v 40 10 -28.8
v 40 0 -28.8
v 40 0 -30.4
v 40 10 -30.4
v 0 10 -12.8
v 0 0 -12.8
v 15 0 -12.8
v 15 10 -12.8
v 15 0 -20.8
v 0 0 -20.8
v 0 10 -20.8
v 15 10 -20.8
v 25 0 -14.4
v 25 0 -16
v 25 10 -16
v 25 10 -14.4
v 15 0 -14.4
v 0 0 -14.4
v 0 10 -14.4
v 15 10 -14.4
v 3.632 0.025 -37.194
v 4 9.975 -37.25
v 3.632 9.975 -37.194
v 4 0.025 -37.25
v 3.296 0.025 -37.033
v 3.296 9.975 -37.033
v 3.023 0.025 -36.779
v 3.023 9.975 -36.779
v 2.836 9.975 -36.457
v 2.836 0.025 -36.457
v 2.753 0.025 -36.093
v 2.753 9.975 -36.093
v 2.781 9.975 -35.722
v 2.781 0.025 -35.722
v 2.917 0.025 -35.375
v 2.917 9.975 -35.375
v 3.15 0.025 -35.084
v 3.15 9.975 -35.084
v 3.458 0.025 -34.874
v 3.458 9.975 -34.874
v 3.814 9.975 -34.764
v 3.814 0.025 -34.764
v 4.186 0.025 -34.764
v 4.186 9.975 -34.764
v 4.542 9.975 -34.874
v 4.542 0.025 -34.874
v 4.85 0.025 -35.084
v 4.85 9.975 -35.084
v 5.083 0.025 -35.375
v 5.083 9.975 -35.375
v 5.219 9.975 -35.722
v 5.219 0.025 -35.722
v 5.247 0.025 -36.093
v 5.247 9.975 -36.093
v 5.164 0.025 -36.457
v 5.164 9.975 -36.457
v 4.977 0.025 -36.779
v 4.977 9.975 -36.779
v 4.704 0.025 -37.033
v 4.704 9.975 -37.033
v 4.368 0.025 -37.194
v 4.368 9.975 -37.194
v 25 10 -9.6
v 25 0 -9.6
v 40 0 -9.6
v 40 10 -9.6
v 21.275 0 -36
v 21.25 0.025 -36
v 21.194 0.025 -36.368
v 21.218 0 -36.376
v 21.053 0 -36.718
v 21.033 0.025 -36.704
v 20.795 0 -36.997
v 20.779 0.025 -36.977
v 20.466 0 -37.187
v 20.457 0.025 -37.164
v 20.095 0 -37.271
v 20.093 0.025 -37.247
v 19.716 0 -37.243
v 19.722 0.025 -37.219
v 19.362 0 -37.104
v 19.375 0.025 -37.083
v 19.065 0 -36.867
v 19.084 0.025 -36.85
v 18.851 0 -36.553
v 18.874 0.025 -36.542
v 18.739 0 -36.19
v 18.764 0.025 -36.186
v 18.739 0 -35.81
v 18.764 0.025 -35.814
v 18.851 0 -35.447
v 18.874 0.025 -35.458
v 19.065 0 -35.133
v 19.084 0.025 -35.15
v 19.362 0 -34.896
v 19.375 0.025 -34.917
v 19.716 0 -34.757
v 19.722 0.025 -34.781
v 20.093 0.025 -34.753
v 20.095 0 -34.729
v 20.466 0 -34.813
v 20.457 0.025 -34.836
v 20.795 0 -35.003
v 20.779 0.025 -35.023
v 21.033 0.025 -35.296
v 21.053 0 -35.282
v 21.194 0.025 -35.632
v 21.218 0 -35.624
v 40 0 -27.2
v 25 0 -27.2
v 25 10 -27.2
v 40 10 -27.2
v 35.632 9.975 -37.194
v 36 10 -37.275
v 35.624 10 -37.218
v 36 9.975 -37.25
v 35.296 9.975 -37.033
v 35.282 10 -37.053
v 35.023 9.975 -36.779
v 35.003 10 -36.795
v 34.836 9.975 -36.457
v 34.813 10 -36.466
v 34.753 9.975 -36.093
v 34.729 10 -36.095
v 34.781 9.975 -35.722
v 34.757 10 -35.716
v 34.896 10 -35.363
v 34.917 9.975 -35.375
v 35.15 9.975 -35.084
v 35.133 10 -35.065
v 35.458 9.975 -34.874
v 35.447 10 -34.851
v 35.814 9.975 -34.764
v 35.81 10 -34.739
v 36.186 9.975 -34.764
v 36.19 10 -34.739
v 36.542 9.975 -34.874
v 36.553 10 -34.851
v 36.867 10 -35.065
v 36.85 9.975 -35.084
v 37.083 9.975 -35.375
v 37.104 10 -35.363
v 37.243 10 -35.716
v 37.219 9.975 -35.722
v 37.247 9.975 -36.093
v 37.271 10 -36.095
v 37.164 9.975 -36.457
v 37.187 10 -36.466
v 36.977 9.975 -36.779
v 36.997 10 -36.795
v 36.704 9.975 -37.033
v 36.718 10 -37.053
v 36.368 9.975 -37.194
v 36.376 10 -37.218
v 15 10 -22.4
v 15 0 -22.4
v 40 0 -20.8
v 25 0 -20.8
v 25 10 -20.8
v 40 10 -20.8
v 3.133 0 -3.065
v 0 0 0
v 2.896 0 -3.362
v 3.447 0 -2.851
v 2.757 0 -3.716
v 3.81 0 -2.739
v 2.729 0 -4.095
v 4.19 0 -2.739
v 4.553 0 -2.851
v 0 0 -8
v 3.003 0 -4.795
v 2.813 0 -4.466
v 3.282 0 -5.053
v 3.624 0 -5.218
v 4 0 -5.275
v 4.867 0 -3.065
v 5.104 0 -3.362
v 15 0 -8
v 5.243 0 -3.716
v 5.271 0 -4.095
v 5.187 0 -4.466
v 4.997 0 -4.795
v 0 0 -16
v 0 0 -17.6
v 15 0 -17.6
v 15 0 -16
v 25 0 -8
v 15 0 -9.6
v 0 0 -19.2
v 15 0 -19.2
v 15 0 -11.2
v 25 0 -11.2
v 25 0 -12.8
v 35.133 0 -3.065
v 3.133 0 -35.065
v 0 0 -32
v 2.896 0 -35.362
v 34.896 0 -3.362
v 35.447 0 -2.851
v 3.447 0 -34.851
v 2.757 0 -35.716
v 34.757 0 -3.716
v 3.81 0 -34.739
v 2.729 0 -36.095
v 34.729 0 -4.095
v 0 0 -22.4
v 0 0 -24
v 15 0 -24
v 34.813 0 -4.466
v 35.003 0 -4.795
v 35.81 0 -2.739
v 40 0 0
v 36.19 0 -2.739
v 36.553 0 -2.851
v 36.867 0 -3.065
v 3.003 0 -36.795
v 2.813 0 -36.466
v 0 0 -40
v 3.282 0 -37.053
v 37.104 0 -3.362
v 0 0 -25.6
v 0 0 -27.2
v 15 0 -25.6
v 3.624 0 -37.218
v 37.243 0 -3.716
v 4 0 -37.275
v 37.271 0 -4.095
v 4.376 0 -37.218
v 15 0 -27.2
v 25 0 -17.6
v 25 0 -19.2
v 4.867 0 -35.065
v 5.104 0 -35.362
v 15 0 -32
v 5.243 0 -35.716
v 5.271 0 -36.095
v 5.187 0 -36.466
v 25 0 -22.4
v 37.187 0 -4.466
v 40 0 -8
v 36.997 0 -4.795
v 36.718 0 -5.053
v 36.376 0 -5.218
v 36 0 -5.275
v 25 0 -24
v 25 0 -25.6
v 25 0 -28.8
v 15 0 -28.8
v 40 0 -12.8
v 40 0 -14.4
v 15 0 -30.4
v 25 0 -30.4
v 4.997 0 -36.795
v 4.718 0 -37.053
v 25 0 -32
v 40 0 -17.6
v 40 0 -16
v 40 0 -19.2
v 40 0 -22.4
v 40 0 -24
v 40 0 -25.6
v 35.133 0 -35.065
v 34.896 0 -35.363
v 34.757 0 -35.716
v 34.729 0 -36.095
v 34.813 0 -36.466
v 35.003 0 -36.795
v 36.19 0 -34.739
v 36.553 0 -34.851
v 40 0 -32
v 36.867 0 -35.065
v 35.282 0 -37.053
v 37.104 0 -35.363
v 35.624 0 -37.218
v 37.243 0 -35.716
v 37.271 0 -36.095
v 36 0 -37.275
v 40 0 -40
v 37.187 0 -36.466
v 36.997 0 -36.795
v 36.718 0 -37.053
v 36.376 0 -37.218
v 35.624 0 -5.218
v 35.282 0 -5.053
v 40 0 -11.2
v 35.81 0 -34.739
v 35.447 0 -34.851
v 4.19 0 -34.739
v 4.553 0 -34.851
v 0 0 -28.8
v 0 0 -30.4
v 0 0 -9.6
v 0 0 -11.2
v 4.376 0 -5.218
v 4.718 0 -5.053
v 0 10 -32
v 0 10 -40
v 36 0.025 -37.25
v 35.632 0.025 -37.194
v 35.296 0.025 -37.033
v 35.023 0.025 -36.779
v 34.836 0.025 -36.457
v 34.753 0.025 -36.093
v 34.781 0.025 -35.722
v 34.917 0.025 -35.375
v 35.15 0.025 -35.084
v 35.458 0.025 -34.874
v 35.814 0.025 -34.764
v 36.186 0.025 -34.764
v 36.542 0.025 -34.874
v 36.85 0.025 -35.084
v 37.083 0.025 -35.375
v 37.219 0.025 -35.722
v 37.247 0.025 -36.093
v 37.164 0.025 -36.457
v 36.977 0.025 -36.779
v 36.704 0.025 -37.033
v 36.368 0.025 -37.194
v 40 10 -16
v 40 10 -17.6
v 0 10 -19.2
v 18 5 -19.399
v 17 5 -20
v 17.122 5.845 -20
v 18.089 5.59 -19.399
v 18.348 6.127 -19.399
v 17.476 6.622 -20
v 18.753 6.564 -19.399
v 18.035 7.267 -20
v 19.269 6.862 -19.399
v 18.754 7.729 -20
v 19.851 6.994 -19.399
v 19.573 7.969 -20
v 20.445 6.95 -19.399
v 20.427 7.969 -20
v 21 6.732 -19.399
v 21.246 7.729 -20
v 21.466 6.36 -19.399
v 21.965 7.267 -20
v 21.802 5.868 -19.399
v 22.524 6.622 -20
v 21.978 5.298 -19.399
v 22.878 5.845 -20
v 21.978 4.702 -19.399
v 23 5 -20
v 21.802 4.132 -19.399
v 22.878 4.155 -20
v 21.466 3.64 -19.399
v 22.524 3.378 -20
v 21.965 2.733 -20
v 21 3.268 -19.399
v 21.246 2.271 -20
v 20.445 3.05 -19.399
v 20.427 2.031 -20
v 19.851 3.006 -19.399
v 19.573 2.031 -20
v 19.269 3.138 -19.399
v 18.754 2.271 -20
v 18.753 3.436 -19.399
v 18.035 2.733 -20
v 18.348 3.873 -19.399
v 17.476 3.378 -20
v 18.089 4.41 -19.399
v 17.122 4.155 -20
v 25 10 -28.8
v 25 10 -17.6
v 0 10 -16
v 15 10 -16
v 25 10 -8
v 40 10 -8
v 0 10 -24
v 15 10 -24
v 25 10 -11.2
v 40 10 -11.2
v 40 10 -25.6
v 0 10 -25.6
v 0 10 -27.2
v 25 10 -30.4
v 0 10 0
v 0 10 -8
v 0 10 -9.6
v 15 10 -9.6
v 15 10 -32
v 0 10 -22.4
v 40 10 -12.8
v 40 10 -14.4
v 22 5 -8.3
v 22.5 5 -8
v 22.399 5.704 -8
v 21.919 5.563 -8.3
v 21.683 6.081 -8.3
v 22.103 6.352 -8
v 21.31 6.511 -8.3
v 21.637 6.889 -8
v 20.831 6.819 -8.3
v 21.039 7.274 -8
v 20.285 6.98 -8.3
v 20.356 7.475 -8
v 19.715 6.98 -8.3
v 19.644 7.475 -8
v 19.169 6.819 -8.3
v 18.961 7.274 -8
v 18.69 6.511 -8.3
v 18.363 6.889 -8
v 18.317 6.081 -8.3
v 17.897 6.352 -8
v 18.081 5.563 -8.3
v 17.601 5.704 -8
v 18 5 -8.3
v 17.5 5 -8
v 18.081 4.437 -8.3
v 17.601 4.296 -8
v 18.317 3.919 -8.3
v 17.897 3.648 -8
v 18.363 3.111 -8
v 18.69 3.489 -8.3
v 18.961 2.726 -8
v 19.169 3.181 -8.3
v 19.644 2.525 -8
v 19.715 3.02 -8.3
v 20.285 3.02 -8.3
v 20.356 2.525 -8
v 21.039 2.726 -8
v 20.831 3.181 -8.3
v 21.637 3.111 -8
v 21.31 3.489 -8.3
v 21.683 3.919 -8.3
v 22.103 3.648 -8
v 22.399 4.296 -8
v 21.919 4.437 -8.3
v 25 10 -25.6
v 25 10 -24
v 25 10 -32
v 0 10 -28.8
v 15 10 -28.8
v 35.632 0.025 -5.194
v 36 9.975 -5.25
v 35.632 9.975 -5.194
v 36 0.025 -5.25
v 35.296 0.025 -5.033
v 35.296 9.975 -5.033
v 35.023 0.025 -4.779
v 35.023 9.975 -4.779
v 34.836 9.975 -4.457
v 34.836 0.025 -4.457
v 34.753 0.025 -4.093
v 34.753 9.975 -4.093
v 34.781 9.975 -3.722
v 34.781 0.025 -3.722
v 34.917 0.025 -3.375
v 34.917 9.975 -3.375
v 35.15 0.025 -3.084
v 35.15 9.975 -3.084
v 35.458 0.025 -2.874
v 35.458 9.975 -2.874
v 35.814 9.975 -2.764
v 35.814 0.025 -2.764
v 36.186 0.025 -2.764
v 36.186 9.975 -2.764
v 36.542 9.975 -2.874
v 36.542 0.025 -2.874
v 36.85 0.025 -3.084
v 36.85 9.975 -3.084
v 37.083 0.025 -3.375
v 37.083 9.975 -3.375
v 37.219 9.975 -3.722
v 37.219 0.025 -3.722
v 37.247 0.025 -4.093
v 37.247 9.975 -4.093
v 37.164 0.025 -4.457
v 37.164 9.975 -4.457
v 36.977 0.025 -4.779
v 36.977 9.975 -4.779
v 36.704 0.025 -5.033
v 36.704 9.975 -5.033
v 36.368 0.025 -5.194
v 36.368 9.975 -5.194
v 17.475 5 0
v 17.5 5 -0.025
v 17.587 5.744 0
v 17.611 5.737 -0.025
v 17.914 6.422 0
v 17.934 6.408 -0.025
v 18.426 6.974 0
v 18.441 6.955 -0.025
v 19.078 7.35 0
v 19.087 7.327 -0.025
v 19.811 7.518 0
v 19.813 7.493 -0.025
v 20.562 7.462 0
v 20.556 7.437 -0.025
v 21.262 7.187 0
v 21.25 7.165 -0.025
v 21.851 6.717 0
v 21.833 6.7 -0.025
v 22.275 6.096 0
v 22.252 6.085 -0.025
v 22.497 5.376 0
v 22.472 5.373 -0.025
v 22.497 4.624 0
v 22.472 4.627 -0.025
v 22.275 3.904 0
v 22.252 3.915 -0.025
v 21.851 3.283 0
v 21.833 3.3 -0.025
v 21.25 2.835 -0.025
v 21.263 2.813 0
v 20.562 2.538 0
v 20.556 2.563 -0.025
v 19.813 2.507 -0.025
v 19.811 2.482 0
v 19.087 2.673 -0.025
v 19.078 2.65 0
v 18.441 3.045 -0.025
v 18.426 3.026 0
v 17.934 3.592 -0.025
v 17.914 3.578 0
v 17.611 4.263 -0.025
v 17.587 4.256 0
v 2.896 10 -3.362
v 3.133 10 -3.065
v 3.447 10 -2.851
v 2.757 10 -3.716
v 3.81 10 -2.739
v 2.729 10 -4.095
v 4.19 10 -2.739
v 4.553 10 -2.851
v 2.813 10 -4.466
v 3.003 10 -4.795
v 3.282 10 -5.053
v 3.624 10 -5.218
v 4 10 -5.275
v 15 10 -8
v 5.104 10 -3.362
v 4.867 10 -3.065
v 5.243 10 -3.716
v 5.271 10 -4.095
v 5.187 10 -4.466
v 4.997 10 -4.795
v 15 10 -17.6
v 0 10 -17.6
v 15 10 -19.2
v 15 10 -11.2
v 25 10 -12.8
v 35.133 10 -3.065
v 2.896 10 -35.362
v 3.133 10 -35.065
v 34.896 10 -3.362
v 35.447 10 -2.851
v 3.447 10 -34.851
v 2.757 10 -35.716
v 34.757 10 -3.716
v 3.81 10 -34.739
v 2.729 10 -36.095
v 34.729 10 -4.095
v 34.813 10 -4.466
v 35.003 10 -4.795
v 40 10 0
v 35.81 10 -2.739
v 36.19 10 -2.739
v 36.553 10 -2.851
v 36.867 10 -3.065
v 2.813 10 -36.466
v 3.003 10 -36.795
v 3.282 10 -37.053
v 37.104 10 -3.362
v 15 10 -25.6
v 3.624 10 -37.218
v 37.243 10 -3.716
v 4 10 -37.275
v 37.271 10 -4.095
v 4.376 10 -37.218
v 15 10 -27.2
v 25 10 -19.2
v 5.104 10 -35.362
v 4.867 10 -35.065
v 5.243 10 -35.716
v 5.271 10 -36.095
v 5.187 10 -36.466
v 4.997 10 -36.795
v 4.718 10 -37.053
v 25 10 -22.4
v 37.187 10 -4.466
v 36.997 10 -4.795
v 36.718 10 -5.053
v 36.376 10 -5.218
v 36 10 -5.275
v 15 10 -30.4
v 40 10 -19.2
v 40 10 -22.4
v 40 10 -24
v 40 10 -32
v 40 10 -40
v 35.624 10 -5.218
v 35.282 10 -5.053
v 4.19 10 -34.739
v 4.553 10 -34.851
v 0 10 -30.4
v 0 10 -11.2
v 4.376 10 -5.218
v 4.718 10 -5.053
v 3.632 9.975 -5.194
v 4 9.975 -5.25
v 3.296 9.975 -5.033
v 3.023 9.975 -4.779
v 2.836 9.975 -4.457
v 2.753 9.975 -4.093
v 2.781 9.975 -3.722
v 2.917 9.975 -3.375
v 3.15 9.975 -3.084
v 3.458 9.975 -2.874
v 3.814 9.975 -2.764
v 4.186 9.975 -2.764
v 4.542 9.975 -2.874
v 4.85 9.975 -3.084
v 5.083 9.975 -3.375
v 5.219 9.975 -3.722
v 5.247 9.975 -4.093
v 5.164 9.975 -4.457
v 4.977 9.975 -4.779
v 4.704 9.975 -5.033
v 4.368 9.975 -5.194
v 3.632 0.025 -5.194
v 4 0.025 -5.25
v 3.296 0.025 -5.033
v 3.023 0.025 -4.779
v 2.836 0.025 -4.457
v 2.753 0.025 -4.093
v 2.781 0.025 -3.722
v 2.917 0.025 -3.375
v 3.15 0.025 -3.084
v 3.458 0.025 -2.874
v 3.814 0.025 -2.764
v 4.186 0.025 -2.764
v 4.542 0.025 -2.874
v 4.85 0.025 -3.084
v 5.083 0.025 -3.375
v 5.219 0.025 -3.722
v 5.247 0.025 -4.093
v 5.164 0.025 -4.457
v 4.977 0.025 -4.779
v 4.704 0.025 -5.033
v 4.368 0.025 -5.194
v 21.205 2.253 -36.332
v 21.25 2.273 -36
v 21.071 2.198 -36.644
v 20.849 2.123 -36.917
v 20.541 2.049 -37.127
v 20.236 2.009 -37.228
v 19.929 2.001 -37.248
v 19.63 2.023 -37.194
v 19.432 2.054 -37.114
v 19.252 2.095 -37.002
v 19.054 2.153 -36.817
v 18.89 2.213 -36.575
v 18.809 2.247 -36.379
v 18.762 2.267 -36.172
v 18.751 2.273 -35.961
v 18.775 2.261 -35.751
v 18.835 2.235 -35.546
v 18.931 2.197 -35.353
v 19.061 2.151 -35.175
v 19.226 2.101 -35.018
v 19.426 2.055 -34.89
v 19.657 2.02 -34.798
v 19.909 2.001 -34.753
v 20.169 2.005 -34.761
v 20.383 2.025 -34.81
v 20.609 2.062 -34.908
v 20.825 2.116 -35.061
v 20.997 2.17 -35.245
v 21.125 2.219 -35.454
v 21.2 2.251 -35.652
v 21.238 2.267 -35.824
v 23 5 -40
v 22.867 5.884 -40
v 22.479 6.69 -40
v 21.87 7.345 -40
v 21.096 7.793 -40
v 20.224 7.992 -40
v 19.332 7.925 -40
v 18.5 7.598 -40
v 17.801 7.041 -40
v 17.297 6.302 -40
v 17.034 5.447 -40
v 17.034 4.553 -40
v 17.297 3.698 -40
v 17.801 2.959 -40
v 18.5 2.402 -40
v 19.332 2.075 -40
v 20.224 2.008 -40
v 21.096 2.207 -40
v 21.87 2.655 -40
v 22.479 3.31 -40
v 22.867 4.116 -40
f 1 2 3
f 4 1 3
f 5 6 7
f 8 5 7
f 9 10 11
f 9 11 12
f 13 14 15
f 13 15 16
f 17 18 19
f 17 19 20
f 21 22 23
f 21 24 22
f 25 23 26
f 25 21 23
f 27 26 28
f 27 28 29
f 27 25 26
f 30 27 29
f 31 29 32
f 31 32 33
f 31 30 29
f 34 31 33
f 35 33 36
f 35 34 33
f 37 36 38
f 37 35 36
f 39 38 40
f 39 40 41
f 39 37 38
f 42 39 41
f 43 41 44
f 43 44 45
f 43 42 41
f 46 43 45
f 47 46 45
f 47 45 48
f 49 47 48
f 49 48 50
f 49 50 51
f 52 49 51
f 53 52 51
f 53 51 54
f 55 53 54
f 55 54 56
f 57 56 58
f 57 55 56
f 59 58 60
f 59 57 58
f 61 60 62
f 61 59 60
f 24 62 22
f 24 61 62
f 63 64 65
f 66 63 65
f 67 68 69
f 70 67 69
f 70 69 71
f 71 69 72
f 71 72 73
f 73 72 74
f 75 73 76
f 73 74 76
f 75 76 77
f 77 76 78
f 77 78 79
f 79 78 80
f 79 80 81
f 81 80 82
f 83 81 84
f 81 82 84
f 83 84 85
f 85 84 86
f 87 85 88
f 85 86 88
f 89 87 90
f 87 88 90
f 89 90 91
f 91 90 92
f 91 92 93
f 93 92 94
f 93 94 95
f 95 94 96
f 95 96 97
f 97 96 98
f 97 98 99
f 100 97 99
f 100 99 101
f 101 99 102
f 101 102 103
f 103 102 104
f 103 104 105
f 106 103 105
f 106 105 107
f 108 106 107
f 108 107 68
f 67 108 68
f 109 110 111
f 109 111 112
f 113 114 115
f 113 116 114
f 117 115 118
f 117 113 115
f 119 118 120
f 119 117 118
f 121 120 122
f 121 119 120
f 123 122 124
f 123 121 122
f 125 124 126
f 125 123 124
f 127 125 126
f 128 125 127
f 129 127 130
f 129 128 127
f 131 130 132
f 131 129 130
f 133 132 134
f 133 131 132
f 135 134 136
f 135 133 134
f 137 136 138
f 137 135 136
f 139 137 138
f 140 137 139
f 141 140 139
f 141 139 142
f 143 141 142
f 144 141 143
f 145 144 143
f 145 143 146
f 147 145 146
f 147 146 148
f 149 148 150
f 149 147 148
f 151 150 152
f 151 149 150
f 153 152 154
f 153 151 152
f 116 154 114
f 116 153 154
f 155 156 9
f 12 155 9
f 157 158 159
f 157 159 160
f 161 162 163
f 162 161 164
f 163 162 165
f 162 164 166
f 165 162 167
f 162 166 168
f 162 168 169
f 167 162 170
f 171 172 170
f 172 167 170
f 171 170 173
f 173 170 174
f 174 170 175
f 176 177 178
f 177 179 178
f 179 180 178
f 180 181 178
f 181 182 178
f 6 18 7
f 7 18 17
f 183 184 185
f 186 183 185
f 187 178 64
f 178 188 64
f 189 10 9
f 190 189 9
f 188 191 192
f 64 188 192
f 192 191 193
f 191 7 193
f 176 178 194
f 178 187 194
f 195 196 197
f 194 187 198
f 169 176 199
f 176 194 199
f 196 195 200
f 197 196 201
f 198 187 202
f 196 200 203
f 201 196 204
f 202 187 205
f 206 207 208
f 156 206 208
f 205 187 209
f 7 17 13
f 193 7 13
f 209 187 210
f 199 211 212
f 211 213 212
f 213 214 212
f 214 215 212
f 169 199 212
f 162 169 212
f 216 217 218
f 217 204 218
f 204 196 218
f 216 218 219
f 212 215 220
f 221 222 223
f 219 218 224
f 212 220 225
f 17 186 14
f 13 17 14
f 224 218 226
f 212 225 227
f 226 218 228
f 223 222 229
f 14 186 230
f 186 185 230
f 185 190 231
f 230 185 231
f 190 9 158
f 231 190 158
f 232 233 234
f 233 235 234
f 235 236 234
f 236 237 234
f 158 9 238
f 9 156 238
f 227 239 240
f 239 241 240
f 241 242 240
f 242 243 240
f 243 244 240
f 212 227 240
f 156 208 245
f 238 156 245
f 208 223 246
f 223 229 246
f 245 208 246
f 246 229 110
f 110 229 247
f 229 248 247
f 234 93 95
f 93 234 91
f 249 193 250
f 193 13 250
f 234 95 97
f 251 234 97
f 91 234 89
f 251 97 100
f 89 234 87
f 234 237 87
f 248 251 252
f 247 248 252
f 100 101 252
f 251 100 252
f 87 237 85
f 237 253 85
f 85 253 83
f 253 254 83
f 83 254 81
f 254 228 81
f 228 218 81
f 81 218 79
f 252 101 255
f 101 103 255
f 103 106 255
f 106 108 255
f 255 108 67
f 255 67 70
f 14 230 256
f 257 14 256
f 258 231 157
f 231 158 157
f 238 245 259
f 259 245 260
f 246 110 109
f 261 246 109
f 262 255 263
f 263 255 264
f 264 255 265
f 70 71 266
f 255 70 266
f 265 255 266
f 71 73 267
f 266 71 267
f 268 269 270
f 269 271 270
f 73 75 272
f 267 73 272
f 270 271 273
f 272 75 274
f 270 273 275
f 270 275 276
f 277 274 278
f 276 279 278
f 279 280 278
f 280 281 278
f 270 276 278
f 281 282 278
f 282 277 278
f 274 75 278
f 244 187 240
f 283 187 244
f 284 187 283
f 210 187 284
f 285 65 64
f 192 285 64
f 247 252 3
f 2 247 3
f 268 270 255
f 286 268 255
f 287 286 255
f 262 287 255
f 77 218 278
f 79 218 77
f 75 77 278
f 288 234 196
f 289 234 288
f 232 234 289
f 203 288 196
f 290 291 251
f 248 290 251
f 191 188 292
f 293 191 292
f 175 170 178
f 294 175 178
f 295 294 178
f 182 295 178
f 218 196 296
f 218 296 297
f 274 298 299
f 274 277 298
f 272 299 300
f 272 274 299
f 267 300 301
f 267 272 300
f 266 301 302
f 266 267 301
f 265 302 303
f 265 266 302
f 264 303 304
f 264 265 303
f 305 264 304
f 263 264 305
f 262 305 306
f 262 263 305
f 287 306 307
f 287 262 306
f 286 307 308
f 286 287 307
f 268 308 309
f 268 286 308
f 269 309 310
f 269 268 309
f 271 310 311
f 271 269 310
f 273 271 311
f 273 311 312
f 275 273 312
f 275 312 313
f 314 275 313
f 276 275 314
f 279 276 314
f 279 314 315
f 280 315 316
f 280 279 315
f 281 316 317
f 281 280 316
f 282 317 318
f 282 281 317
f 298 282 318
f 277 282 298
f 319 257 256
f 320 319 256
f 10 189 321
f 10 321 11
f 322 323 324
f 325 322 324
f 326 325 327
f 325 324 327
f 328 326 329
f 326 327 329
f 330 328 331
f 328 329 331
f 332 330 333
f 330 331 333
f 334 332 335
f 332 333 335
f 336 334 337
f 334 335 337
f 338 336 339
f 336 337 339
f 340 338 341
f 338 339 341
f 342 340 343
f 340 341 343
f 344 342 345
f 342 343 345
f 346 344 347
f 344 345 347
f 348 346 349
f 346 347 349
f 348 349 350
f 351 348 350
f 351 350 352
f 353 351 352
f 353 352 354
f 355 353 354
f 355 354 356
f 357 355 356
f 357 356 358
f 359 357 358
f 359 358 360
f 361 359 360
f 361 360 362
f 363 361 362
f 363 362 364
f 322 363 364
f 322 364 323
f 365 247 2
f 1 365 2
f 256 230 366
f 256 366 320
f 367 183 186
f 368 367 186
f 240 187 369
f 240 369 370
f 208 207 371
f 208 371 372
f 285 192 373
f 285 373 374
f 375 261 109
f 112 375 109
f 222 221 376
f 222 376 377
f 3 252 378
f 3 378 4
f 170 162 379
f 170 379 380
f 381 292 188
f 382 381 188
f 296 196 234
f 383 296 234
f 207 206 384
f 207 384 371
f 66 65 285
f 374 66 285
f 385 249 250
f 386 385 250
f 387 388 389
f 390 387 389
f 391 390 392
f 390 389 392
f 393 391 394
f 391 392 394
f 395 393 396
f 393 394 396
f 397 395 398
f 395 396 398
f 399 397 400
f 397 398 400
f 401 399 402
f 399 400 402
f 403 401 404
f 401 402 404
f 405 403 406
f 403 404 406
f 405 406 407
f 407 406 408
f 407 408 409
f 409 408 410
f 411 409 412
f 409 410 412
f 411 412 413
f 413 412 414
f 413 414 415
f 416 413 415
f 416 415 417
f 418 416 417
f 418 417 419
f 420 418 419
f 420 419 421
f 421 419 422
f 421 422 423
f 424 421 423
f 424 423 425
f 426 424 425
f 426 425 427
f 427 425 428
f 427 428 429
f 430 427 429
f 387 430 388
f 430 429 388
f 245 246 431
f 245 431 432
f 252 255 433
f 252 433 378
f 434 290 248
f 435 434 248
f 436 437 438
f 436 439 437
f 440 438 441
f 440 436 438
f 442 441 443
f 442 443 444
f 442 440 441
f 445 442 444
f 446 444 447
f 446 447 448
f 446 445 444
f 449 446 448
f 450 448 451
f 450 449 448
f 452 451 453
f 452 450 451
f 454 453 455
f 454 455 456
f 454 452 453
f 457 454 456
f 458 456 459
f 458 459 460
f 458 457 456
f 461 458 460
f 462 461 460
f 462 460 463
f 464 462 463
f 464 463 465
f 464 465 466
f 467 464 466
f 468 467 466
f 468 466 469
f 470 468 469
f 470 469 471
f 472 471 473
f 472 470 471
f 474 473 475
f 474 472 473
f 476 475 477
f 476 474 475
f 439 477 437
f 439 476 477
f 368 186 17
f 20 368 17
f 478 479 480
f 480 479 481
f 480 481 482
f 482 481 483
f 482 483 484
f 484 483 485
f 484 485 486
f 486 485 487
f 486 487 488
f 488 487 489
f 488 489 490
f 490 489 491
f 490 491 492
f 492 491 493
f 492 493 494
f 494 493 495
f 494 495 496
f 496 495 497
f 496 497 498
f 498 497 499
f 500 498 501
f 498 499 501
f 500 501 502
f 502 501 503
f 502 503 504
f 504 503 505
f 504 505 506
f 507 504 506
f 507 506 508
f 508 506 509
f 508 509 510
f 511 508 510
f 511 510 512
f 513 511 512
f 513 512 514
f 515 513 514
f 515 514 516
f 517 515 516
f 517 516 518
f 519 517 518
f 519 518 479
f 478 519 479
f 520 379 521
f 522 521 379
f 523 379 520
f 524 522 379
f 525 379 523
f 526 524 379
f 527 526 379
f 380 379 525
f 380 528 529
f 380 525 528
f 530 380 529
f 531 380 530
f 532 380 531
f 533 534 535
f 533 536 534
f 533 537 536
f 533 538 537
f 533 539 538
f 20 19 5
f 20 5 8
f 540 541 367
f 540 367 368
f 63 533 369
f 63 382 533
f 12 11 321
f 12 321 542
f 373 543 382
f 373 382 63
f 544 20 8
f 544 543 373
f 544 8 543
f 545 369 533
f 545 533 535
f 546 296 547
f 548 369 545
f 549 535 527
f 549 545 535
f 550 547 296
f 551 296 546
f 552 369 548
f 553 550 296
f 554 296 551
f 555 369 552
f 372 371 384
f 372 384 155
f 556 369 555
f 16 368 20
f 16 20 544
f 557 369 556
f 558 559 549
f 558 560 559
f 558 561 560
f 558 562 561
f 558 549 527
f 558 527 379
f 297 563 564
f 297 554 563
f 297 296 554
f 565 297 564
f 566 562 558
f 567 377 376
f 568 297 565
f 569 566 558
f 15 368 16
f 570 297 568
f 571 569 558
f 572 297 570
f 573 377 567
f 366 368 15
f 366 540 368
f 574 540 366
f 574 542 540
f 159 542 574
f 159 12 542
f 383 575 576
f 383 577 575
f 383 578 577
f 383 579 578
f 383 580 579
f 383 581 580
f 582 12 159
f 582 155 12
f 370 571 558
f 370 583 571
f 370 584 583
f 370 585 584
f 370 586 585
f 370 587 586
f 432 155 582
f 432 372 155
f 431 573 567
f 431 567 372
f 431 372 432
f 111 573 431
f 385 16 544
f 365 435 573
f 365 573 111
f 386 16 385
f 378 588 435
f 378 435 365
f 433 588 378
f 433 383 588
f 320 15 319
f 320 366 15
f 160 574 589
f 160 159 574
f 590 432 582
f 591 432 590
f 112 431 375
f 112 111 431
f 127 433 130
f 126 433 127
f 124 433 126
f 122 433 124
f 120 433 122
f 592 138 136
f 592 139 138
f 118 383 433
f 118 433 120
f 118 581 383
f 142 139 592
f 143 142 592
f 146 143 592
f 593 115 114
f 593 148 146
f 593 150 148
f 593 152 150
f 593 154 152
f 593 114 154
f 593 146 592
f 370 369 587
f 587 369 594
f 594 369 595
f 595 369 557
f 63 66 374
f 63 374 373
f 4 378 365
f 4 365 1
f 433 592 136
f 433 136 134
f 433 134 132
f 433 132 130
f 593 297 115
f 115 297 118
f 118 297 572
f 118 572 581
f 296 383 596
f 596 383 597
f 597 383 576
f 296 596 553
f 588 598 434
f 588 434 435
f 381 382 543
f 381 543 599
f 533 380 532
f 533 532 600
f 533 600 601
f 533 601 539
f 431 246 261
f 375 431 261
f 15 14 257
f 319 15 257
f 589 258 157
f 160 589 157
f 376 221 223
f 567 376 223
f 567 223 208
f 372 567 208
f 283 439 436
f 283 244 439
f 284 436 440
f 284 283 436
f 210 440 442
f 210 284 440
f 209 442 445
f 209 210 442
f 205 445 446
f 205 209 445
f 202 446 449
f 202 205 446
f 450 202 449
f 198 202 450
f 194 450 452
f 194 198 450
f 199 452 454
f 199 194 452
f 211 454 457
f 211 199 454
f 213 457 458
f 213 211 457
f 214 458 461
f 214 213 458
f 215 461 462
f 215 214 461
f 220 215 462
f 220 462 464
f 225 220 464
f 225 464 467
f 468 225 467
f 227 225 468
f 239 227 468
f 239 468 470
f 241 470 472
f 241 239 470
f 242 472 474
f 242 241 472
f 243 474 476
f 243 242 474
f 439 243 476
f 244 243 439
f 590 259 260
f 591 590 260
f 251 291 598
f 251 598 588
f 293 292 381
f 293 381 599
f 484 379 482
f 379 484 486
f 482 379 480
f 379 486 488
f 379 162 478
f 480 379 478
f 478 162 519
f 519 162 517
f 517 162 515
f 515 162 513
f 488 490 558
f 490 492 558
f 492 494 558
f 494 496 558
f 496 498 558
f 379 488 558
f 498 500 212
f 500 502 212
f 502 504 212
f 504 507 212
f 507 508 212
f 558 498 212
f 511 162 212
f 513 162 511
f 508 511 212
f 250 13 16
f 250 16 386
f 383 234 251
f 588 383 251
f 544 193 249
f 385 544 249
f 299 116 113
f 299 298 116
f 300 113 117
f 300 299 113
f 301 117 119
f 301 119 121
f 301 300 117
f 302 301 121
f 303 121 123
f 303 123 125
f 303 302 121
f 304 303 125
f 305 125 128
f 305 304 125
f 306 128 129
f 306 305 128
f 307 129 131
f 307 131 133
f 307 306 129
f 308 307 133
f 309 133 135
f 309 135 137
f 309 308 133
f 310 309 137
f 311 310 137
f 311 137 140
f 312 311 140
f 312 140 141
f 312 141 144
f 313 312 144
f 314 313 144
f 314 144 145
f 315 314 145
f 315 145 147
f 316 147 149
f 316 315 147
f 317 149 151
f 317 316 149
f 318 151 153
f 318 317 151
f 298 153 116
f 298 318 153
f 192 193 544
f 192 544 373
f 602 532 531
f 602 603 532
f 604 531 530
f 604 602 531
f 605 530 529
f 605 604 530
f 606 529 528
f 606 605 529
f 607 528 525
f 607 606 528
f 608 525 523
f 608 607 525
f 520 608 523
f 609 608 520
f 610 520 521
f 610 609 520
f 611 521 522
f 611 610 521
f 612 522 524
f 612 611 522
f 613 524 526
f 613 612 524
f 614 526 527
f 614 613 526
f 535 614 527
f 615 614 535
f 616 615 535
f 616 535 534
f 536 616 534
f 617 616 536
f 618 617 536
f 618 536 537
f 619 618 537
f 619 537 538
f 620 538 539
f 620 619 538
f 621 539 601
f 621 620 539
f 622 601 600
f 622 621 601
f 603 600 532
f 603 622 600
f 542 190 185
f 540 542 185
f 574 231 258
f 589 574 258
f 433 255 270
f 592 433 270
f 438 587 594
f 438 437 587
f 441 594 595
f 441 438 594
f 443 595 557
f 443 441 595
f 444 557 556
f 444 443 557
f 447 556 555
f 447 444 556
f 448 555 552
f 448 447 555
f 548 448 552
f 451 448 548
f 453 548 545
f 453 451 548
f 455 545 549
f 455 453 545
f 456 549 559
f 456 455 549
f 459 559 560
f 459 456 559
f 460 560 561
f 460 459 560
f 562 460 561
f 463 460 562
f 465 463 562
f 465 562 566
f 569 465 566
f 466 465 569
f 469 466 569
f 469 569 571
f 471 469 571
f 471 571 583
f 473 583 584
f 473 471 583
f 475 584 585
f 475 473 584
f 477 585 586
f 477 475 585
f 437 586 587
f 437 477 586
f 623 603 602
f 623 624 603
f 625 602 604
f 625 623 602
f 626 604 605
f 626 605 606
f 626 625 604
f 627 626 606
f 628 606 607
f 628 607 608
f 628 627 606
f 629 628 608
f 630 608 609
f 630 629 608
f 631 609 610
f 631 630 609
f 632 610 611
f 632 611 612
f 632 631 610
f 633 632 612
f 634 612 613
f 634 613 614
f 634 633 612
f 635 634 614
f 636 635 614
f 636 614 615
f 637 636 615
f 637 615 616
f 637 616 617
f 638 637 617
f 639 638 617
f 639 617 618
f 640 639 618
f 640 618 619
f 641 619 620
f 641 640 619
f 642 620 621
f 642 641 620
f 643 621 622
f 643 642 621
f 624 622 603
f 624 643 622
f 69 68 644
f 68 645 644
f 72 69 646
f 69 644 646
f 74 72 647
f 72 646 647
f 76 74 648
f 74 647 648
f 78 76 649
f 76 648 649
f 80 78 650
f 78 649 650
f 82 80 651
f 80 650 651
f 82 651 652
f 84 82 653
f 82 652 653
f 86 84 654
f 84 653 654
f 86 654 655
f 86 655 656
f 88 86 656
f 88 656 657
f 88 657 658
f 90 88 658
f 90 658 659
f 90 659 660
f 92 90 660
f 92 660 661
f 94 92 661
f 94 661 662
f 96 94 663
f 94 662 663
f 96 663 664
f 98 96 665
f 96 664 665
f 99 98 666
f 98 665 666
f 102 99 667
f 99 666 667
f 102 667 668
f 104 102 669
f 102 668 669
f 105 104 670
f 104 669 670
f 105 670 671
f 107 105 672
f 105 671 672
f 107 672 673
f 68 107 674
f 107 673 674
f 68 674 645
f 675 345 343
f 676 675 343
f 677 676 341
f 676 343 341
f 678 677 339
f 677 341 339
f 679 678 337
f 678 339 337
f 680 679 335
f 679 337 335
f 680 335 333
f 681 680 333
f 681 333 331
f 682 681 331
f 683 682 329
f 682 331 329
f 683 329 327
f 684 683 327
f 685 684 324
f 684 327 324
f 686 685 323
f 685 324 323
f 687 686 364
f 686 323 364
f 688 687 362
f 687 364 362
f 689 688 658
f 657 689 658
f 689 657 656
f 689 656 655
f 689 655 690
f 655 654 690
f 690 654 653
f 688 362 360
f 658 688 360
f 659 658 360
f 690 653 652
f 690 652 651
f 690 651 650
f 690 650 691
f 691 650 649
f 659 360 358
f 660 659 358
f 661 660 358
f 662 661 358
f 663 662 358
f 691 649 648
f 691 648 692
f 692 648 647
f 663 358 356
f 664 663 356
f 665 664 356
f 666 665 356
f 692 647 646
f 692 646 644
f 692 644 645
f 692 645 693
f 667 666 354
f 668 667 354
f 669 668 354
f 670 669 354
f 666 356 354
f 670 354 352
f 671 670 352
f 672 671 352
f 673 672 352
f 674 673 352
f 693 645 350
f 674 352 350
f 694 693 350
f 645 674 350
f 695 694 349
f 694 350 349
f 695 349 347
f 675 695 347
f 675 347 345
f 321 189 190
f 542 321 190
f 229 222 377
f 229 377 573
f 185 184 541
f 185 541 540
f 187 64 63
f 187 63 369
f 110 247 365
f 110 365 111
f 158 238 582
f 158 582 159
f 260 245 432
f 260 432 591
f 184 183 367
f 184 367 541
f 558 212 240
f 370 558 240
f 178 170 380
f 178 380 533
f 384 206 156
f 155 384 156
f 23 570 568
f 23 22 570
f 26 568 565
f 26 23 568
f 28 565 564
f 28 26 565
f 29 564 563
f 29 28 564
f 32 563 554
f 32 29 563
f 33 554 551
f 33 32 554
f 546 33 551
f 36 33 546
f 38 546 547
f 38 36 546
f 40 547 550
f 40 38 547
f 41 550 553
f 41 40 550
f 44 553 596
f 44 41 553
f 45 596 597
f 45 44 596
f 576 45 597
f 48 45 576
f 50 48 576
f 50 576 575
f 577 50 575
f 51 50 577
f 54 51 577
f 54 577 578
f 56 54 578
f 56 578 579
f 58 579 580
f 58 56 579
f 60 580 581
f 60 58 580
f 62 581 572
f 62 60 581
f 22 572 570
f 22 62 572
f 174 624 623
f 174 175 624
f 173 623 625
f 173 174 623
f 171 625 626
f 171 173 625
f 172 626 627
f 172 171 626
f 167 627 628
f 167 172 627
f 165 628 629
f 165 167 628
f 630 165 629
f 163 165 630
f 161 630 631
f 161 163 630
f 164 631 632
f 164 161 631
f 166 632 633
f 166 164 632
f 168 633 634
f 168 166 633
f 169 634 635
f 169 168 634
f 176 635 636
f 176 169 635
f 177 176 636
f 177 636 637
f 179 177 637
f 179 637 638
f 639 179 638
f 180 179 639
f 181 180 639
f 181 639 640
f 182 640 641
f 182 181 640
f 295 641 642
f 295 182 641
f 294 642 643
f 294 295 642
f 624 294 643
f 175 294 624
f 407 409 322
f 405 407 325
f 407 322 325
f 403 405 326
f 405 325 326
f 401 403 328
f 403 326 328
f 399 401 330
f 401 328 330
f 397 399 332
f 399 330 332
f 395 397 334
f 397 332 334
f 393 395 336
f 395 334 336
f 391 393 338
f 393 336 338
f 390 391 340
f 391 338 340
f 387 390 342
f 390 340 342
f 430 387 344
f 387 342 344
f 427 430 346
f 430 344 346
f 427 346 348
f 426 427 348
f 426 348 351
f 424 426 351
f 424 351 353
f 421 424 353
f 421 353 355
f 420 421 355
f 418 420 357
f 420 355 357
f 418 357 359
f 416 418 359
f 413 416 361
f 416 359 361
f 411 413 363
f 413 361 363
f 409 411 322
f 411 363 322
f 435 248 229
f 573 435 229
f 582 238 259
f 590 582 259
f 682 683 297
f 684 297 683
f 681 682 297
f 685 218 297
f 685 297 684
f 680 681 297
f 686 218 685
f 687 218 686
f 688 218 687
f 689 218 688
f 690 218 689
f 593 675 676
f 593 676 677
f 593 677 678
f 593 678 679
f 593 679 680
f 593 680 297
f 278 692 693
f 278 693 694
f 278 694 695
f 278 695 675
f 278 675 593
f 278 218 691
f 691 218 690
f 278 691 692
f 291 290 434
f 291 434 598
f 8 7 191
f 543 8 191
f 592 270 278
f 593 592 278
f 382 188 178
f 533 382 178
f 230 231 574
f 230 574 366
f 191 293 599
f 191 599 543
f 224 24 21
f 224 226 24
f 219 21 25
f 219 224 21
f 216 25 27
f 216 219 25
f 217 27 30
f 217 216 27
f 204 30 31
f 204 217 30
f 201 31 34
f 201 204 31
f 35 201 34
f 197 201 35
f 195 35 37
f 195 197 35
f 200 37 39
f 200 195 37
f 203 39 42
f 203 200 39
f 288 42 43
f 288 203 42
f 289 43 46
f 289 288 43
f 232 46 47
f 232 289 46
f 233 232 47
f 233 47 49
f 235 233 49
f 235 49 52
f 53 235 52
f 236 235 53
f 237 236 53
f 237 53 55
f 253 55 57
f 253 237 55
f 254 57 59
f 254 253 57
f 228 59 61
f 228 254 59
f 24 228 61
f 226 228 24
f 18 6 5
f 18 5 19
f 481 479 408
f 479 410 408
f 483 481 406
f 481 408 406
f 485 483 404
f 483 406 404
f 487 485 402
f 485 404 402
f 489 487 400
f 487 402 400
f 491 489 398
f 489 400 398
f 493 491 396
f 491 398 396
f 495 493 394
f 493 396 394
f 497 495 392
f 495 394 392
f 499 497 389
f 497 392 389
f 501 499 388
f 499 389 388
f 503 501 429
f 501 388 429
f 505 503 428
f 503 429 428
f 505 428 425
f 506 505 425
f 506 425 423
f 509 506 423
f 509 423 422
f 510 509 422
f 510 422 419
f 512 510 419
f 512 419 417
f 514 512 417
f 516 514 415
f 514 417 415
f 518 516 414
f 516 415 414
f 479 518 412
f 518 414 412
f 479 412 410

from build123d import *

# Parameters (mm, degrees)
ESQUISSE1_W                                         = 40
ESQUISSE1_H                                         = 40
BOSS_EXTRU_1_DEPTH                                  = 10
DIAM_TRE_DU_PER_AGE_4_0_4_1_D                       = 4
TROU_POUR_TARAUDAGE_POUR_TROU_TARAUD_M6_D           = 5
TROU_POUR_TARAUDAGE_POUR_TROU_TARAUD_M6_DEPTH       = 8
TROU_POUR_TARAUDAGE_POUR_TROU_TARAUD_M6_CSINK_D     = 5.05
TROU_POUR_TARAUDAGE_POUR_TROU_TARAUD_M6_CSINK_ANGLE = 90
TROU_POUR_TARAUDAGE_POUR_TROU_TARAUD_M6_TIP         = 1.502151548
DIAM_TRE_DU_PER_AGE_6_0_6_1_D                       = 6
DIAM_TRE_DU_PER_AGE_6_0_6_1_DEPTH                   = 20
DIAM_TRE_DU_PER_AGE_6_0_6_1_TIP                     = 1.802581857
TROU_POUR_TARAUDAGE_POUR_TROU_TARAUD_2_COUNT        = 2
TROU_POUR_TARAUDAGE_POUR_TROU_TARAUD_2_PITCH        = 32
TROU_POUR_TARAUDAGE_POUR_TROU_TARAUD_3_COUNT        = 2
TROU_POUR_TARAUDAGE_POUR_TROU_TARAUD_3_PITCH        = 45.254833996
TROU_POUR_TARAUDAGE_POUR_TROU_TARAUD_4_COUNT        = 2
TROU_POUR_TARAUDAGE_POUR_TROU_TARAUD_4_PITCH        = 32
TROU_POUR_TARAUDAGE_POUR_TROU_TARAUD_5_D            = 2.5
TROU_POUR_TARAUDAGE_POUR_TROU_TARAUD_5_DEPTH        = 5
TROU_POUR_TARAUDAGE_POUR_TROU_TARAUD_5_CSINK_D      = 2.55
TROU_POUR_TARAUDAGE_POUR_TROU_TARAUD_5_CSINK_ANGLE  = 90
TROU_POUR_TARAUDAGE_POUR_TROU_TARAUD_5_TIP          = 0.751075774
ESQUISSE21_W                                        = 15
ESQUISSE21_H                                        = 1.6
ENL_V_MAT_EXTRU_1_DEPTH                             = 58.445626535
R_P_TITION_LIN_AIRE1_COUNT                          = 8
R_P_TITION_LIN_AIRE1_PITCH                          = 3.2


with BuildPart() as part:
    # Esquisse1 → Boss.-Extru.1 (new body)
    with BuildSketch(Plane(origin=(0, 0, 0), x_dir=(1, 0, 0), z_dir=(0, 1, 0))):
        with Locations((20, 20)):
            Rectangle(ESQUISSE1_W, ESQUISSE1_H)
    extrude(amount=BOSS_EXTRU_1_DEPTH)

    # Diamètre du perçage Ø4.0 (4)1 (through all)
    with Locations(Plane.XY):
        with Locations((20, 5)):
            Hole(DIAM_TRE_DU_PER_AGE_4_0_4_1_D / 2)

    # Trou pour taraudage pour trou taraudé M61
    with Locations(Plane.XY):
        with Locations((20, 5)):
            CounterSinkHole(TROU_POUR_TARAUDAGE_POUR_TROU_TARAUD_M6_D / 2, TROU_POUR_TARAUDAGE_POUR_TROU_TARAUD_M6_CSINK_D / 2, depth=TROU_POUR_TARAUDAGE_POUR_TROU_TARAUD_M6_DEPTH, counter_sink_angle=TROU_POUR_TARAUDAGE_POUR_TROU_TARAUD_M6_CSINK_ANGLE)
            with Locations((0, 0, -(TROU_POUR_TARAUDAGE_POUR_TROU_TARAUD_M6_DEPTH + TROU_POUR_TARAUDAGE_POUR_TROU_TARAUD_M6_TIP / 2))):  # 118° drill point
                Cone(0, TROU_POUR_TARAUDAGE_POUR_TROU_TARAUD_M6_D / 2, TROU_POUR_TARAUDAGE_POUR_TROU_TARAUD_M6_TIP, mode=Mode.SUBTRACT)

    # Diamètre du perçage Ø6.0 (6)1
    with Locations(Plane(origin=(0, 0, -40), x_dir=(-1, 0, 0), z_dir=(0, 0, -1))):
        with Locations((-20, 5)):
            Hole(DIAM_TRE_DU_PER_AGE_6_0_6_1_D / 2, depth=DIAM_TRE_DU_PER_AGE_6_0_6_1_DEPTH)
            with Locations((0, 0, -(DIAM_TRE_DU_PER_AGE_6_0_6_1_DEPTH + DIAM_TRE_DU_PER_AGE_6_0_6_1_TIP / 2))):  # 118° drill point
                Cone(0, DIAM_TRE_DU_PER_AGE_6_0_6_1_D / 2, DIAM_TRE_DU_PER_AGE_6_0_6_1_TIP, mode=Mode.SUBTRACT)

    # Esquisse17 → Trou pour taraudage pour trou taraud_ M3 (revolve, cut)
    with BuildSketch(Plane(origin=(4, 0, -4), x_dir=(0, 0, -1), z_dir=(1, 0, 0))):
        Polygon((0, 0), (0, 10), (1.275, 10), (1.25, 9.975), (1.25, 0.025), (1.275, 0), align=None)
    trou_pour_taraudage_pour_trou_taraud_m3 = revolve(axis=Axis((4, -6.35, -4), (0, 1, 0)), mode=Mode.SUBTRACT)

    # Trou pour taraudage pour trou taraud 2: Trou pour taraudage pour trou taraud_ M3 ×2
    with Locations(*[(i * TROU_POUR_TARAUDAGE_POUR_TROU_TARAUD_2_PITCH, 0, 0) for i in range(1, TROU_POUR_TARAUDAGE_POUR_TROU_TARAUD_2_COUNT)]):
        add(trou_pour_taraudage_pour_trou_taraud_m3, mode=Mode.SUBTRACT)

    # Trou pour taraudage pour trou taraud 3: Trou pour taraudage pour trou taraud_ M3 ×2
    with Locations(*[Vector(0.7071067811865475, 0, -0.7071067811865476) * (i * TROU_POUR_TARAUDAGE_POUR_TROU_TARAUD_3_PITCH) for i in range(1, TROU_POUR_TARAUDAGE_POUR_TROU_TARAUD_3_COUNT)]):
        add(trou_pour_taraudage_pour_trou_taraud_m3, mode=Mode.SUBTRACT)

    # Trou pour taraudage pour trou taraud 4: Trou pour taraudage pour trou taraud_ M3 ×2
    with Locations(*[(0, 0, -i * TROU_POUR_TARAUDAGE_POUR_TROU_TARAUD_4_PITCH) for i in range(1, TROU_POUR_TARAUDAGE_POUR_TROU_TARAUD_4_COUNT)]):
        add(trou_pour_taraudage_pour_trou_taraud_m3, mode=Mode.SUBTRACT)

    # Trou pour taraudage pour trou taraud 5
    with Locations(Plane(origin=(0, 0, 0), x_dir=(-1, 0, 0), z_dir=(0, -1, 0))):
        with Locations((-20, 36)):
            CounterSinkHole(TROU_POUR_TARAUDAGE_POUR_TROU_TARAUD_5_D / 2, TROU_POUR_TARAUDAGE_POUR_TROU_TARAUD_5_CSINK_D / 2, depth=TROU_POUR_TARAUDAGE_POUR_TROU_TARAUD_5_DEPTH, counter_sink_angle=TROU_POUR_TARAUDAGE_POUR_TROU_TARAUD_5_CSINK_ANGLE)
            with Locations((0, 0, -(TROU_POUR_TARAUDAGE_POUR_TROU_TARAUD_5_DEPTH + TROU_POUR_TARAUDAGE_POUR_TROU_TARAUD_5_TIP / 2))):  # 118° drill point
                Cone(0, TROU_POUR_TARAUDAGE_POUR_TROU_TARAUD_5_D / 2, TROU_POUR_TARAUDAGE_POUR_TROU_TARAUD_5_TIP, mode=Mode.SUBTRACT)

    # Esquisse21 → Enlèv. mat.-Extru.1 (cut, through all)
    with BuildSketch(Plane.XZ):
        with Locations((7.5, -8.8)):
            Rectangle(ESQUISSE21_W, ESQUISSE21_H)
        with Locations((32.5, -8.8)):
            Rectangle(ESQUISSE21_W, ESQUISSE21_H)
    enl_v_mat_extru_1 = extrude(amount=-ENL_V_MAT_EXTRU_1_DEPTH, mode=Mode.SUBTRACT)

    # Répétition linéaire1: Enlèv. mat.-Extru.1 ×8
    with Locations(*[(0, 0, -i * R_P_TITION_LIN_AIRE1_PITCH) for i in range(1, R_P_TITION_LIN_AIRE1_COUNT)]):
        add(enl_v_mat_extru_1, mode=Mode.SUBTRACT)


solid = part.part
